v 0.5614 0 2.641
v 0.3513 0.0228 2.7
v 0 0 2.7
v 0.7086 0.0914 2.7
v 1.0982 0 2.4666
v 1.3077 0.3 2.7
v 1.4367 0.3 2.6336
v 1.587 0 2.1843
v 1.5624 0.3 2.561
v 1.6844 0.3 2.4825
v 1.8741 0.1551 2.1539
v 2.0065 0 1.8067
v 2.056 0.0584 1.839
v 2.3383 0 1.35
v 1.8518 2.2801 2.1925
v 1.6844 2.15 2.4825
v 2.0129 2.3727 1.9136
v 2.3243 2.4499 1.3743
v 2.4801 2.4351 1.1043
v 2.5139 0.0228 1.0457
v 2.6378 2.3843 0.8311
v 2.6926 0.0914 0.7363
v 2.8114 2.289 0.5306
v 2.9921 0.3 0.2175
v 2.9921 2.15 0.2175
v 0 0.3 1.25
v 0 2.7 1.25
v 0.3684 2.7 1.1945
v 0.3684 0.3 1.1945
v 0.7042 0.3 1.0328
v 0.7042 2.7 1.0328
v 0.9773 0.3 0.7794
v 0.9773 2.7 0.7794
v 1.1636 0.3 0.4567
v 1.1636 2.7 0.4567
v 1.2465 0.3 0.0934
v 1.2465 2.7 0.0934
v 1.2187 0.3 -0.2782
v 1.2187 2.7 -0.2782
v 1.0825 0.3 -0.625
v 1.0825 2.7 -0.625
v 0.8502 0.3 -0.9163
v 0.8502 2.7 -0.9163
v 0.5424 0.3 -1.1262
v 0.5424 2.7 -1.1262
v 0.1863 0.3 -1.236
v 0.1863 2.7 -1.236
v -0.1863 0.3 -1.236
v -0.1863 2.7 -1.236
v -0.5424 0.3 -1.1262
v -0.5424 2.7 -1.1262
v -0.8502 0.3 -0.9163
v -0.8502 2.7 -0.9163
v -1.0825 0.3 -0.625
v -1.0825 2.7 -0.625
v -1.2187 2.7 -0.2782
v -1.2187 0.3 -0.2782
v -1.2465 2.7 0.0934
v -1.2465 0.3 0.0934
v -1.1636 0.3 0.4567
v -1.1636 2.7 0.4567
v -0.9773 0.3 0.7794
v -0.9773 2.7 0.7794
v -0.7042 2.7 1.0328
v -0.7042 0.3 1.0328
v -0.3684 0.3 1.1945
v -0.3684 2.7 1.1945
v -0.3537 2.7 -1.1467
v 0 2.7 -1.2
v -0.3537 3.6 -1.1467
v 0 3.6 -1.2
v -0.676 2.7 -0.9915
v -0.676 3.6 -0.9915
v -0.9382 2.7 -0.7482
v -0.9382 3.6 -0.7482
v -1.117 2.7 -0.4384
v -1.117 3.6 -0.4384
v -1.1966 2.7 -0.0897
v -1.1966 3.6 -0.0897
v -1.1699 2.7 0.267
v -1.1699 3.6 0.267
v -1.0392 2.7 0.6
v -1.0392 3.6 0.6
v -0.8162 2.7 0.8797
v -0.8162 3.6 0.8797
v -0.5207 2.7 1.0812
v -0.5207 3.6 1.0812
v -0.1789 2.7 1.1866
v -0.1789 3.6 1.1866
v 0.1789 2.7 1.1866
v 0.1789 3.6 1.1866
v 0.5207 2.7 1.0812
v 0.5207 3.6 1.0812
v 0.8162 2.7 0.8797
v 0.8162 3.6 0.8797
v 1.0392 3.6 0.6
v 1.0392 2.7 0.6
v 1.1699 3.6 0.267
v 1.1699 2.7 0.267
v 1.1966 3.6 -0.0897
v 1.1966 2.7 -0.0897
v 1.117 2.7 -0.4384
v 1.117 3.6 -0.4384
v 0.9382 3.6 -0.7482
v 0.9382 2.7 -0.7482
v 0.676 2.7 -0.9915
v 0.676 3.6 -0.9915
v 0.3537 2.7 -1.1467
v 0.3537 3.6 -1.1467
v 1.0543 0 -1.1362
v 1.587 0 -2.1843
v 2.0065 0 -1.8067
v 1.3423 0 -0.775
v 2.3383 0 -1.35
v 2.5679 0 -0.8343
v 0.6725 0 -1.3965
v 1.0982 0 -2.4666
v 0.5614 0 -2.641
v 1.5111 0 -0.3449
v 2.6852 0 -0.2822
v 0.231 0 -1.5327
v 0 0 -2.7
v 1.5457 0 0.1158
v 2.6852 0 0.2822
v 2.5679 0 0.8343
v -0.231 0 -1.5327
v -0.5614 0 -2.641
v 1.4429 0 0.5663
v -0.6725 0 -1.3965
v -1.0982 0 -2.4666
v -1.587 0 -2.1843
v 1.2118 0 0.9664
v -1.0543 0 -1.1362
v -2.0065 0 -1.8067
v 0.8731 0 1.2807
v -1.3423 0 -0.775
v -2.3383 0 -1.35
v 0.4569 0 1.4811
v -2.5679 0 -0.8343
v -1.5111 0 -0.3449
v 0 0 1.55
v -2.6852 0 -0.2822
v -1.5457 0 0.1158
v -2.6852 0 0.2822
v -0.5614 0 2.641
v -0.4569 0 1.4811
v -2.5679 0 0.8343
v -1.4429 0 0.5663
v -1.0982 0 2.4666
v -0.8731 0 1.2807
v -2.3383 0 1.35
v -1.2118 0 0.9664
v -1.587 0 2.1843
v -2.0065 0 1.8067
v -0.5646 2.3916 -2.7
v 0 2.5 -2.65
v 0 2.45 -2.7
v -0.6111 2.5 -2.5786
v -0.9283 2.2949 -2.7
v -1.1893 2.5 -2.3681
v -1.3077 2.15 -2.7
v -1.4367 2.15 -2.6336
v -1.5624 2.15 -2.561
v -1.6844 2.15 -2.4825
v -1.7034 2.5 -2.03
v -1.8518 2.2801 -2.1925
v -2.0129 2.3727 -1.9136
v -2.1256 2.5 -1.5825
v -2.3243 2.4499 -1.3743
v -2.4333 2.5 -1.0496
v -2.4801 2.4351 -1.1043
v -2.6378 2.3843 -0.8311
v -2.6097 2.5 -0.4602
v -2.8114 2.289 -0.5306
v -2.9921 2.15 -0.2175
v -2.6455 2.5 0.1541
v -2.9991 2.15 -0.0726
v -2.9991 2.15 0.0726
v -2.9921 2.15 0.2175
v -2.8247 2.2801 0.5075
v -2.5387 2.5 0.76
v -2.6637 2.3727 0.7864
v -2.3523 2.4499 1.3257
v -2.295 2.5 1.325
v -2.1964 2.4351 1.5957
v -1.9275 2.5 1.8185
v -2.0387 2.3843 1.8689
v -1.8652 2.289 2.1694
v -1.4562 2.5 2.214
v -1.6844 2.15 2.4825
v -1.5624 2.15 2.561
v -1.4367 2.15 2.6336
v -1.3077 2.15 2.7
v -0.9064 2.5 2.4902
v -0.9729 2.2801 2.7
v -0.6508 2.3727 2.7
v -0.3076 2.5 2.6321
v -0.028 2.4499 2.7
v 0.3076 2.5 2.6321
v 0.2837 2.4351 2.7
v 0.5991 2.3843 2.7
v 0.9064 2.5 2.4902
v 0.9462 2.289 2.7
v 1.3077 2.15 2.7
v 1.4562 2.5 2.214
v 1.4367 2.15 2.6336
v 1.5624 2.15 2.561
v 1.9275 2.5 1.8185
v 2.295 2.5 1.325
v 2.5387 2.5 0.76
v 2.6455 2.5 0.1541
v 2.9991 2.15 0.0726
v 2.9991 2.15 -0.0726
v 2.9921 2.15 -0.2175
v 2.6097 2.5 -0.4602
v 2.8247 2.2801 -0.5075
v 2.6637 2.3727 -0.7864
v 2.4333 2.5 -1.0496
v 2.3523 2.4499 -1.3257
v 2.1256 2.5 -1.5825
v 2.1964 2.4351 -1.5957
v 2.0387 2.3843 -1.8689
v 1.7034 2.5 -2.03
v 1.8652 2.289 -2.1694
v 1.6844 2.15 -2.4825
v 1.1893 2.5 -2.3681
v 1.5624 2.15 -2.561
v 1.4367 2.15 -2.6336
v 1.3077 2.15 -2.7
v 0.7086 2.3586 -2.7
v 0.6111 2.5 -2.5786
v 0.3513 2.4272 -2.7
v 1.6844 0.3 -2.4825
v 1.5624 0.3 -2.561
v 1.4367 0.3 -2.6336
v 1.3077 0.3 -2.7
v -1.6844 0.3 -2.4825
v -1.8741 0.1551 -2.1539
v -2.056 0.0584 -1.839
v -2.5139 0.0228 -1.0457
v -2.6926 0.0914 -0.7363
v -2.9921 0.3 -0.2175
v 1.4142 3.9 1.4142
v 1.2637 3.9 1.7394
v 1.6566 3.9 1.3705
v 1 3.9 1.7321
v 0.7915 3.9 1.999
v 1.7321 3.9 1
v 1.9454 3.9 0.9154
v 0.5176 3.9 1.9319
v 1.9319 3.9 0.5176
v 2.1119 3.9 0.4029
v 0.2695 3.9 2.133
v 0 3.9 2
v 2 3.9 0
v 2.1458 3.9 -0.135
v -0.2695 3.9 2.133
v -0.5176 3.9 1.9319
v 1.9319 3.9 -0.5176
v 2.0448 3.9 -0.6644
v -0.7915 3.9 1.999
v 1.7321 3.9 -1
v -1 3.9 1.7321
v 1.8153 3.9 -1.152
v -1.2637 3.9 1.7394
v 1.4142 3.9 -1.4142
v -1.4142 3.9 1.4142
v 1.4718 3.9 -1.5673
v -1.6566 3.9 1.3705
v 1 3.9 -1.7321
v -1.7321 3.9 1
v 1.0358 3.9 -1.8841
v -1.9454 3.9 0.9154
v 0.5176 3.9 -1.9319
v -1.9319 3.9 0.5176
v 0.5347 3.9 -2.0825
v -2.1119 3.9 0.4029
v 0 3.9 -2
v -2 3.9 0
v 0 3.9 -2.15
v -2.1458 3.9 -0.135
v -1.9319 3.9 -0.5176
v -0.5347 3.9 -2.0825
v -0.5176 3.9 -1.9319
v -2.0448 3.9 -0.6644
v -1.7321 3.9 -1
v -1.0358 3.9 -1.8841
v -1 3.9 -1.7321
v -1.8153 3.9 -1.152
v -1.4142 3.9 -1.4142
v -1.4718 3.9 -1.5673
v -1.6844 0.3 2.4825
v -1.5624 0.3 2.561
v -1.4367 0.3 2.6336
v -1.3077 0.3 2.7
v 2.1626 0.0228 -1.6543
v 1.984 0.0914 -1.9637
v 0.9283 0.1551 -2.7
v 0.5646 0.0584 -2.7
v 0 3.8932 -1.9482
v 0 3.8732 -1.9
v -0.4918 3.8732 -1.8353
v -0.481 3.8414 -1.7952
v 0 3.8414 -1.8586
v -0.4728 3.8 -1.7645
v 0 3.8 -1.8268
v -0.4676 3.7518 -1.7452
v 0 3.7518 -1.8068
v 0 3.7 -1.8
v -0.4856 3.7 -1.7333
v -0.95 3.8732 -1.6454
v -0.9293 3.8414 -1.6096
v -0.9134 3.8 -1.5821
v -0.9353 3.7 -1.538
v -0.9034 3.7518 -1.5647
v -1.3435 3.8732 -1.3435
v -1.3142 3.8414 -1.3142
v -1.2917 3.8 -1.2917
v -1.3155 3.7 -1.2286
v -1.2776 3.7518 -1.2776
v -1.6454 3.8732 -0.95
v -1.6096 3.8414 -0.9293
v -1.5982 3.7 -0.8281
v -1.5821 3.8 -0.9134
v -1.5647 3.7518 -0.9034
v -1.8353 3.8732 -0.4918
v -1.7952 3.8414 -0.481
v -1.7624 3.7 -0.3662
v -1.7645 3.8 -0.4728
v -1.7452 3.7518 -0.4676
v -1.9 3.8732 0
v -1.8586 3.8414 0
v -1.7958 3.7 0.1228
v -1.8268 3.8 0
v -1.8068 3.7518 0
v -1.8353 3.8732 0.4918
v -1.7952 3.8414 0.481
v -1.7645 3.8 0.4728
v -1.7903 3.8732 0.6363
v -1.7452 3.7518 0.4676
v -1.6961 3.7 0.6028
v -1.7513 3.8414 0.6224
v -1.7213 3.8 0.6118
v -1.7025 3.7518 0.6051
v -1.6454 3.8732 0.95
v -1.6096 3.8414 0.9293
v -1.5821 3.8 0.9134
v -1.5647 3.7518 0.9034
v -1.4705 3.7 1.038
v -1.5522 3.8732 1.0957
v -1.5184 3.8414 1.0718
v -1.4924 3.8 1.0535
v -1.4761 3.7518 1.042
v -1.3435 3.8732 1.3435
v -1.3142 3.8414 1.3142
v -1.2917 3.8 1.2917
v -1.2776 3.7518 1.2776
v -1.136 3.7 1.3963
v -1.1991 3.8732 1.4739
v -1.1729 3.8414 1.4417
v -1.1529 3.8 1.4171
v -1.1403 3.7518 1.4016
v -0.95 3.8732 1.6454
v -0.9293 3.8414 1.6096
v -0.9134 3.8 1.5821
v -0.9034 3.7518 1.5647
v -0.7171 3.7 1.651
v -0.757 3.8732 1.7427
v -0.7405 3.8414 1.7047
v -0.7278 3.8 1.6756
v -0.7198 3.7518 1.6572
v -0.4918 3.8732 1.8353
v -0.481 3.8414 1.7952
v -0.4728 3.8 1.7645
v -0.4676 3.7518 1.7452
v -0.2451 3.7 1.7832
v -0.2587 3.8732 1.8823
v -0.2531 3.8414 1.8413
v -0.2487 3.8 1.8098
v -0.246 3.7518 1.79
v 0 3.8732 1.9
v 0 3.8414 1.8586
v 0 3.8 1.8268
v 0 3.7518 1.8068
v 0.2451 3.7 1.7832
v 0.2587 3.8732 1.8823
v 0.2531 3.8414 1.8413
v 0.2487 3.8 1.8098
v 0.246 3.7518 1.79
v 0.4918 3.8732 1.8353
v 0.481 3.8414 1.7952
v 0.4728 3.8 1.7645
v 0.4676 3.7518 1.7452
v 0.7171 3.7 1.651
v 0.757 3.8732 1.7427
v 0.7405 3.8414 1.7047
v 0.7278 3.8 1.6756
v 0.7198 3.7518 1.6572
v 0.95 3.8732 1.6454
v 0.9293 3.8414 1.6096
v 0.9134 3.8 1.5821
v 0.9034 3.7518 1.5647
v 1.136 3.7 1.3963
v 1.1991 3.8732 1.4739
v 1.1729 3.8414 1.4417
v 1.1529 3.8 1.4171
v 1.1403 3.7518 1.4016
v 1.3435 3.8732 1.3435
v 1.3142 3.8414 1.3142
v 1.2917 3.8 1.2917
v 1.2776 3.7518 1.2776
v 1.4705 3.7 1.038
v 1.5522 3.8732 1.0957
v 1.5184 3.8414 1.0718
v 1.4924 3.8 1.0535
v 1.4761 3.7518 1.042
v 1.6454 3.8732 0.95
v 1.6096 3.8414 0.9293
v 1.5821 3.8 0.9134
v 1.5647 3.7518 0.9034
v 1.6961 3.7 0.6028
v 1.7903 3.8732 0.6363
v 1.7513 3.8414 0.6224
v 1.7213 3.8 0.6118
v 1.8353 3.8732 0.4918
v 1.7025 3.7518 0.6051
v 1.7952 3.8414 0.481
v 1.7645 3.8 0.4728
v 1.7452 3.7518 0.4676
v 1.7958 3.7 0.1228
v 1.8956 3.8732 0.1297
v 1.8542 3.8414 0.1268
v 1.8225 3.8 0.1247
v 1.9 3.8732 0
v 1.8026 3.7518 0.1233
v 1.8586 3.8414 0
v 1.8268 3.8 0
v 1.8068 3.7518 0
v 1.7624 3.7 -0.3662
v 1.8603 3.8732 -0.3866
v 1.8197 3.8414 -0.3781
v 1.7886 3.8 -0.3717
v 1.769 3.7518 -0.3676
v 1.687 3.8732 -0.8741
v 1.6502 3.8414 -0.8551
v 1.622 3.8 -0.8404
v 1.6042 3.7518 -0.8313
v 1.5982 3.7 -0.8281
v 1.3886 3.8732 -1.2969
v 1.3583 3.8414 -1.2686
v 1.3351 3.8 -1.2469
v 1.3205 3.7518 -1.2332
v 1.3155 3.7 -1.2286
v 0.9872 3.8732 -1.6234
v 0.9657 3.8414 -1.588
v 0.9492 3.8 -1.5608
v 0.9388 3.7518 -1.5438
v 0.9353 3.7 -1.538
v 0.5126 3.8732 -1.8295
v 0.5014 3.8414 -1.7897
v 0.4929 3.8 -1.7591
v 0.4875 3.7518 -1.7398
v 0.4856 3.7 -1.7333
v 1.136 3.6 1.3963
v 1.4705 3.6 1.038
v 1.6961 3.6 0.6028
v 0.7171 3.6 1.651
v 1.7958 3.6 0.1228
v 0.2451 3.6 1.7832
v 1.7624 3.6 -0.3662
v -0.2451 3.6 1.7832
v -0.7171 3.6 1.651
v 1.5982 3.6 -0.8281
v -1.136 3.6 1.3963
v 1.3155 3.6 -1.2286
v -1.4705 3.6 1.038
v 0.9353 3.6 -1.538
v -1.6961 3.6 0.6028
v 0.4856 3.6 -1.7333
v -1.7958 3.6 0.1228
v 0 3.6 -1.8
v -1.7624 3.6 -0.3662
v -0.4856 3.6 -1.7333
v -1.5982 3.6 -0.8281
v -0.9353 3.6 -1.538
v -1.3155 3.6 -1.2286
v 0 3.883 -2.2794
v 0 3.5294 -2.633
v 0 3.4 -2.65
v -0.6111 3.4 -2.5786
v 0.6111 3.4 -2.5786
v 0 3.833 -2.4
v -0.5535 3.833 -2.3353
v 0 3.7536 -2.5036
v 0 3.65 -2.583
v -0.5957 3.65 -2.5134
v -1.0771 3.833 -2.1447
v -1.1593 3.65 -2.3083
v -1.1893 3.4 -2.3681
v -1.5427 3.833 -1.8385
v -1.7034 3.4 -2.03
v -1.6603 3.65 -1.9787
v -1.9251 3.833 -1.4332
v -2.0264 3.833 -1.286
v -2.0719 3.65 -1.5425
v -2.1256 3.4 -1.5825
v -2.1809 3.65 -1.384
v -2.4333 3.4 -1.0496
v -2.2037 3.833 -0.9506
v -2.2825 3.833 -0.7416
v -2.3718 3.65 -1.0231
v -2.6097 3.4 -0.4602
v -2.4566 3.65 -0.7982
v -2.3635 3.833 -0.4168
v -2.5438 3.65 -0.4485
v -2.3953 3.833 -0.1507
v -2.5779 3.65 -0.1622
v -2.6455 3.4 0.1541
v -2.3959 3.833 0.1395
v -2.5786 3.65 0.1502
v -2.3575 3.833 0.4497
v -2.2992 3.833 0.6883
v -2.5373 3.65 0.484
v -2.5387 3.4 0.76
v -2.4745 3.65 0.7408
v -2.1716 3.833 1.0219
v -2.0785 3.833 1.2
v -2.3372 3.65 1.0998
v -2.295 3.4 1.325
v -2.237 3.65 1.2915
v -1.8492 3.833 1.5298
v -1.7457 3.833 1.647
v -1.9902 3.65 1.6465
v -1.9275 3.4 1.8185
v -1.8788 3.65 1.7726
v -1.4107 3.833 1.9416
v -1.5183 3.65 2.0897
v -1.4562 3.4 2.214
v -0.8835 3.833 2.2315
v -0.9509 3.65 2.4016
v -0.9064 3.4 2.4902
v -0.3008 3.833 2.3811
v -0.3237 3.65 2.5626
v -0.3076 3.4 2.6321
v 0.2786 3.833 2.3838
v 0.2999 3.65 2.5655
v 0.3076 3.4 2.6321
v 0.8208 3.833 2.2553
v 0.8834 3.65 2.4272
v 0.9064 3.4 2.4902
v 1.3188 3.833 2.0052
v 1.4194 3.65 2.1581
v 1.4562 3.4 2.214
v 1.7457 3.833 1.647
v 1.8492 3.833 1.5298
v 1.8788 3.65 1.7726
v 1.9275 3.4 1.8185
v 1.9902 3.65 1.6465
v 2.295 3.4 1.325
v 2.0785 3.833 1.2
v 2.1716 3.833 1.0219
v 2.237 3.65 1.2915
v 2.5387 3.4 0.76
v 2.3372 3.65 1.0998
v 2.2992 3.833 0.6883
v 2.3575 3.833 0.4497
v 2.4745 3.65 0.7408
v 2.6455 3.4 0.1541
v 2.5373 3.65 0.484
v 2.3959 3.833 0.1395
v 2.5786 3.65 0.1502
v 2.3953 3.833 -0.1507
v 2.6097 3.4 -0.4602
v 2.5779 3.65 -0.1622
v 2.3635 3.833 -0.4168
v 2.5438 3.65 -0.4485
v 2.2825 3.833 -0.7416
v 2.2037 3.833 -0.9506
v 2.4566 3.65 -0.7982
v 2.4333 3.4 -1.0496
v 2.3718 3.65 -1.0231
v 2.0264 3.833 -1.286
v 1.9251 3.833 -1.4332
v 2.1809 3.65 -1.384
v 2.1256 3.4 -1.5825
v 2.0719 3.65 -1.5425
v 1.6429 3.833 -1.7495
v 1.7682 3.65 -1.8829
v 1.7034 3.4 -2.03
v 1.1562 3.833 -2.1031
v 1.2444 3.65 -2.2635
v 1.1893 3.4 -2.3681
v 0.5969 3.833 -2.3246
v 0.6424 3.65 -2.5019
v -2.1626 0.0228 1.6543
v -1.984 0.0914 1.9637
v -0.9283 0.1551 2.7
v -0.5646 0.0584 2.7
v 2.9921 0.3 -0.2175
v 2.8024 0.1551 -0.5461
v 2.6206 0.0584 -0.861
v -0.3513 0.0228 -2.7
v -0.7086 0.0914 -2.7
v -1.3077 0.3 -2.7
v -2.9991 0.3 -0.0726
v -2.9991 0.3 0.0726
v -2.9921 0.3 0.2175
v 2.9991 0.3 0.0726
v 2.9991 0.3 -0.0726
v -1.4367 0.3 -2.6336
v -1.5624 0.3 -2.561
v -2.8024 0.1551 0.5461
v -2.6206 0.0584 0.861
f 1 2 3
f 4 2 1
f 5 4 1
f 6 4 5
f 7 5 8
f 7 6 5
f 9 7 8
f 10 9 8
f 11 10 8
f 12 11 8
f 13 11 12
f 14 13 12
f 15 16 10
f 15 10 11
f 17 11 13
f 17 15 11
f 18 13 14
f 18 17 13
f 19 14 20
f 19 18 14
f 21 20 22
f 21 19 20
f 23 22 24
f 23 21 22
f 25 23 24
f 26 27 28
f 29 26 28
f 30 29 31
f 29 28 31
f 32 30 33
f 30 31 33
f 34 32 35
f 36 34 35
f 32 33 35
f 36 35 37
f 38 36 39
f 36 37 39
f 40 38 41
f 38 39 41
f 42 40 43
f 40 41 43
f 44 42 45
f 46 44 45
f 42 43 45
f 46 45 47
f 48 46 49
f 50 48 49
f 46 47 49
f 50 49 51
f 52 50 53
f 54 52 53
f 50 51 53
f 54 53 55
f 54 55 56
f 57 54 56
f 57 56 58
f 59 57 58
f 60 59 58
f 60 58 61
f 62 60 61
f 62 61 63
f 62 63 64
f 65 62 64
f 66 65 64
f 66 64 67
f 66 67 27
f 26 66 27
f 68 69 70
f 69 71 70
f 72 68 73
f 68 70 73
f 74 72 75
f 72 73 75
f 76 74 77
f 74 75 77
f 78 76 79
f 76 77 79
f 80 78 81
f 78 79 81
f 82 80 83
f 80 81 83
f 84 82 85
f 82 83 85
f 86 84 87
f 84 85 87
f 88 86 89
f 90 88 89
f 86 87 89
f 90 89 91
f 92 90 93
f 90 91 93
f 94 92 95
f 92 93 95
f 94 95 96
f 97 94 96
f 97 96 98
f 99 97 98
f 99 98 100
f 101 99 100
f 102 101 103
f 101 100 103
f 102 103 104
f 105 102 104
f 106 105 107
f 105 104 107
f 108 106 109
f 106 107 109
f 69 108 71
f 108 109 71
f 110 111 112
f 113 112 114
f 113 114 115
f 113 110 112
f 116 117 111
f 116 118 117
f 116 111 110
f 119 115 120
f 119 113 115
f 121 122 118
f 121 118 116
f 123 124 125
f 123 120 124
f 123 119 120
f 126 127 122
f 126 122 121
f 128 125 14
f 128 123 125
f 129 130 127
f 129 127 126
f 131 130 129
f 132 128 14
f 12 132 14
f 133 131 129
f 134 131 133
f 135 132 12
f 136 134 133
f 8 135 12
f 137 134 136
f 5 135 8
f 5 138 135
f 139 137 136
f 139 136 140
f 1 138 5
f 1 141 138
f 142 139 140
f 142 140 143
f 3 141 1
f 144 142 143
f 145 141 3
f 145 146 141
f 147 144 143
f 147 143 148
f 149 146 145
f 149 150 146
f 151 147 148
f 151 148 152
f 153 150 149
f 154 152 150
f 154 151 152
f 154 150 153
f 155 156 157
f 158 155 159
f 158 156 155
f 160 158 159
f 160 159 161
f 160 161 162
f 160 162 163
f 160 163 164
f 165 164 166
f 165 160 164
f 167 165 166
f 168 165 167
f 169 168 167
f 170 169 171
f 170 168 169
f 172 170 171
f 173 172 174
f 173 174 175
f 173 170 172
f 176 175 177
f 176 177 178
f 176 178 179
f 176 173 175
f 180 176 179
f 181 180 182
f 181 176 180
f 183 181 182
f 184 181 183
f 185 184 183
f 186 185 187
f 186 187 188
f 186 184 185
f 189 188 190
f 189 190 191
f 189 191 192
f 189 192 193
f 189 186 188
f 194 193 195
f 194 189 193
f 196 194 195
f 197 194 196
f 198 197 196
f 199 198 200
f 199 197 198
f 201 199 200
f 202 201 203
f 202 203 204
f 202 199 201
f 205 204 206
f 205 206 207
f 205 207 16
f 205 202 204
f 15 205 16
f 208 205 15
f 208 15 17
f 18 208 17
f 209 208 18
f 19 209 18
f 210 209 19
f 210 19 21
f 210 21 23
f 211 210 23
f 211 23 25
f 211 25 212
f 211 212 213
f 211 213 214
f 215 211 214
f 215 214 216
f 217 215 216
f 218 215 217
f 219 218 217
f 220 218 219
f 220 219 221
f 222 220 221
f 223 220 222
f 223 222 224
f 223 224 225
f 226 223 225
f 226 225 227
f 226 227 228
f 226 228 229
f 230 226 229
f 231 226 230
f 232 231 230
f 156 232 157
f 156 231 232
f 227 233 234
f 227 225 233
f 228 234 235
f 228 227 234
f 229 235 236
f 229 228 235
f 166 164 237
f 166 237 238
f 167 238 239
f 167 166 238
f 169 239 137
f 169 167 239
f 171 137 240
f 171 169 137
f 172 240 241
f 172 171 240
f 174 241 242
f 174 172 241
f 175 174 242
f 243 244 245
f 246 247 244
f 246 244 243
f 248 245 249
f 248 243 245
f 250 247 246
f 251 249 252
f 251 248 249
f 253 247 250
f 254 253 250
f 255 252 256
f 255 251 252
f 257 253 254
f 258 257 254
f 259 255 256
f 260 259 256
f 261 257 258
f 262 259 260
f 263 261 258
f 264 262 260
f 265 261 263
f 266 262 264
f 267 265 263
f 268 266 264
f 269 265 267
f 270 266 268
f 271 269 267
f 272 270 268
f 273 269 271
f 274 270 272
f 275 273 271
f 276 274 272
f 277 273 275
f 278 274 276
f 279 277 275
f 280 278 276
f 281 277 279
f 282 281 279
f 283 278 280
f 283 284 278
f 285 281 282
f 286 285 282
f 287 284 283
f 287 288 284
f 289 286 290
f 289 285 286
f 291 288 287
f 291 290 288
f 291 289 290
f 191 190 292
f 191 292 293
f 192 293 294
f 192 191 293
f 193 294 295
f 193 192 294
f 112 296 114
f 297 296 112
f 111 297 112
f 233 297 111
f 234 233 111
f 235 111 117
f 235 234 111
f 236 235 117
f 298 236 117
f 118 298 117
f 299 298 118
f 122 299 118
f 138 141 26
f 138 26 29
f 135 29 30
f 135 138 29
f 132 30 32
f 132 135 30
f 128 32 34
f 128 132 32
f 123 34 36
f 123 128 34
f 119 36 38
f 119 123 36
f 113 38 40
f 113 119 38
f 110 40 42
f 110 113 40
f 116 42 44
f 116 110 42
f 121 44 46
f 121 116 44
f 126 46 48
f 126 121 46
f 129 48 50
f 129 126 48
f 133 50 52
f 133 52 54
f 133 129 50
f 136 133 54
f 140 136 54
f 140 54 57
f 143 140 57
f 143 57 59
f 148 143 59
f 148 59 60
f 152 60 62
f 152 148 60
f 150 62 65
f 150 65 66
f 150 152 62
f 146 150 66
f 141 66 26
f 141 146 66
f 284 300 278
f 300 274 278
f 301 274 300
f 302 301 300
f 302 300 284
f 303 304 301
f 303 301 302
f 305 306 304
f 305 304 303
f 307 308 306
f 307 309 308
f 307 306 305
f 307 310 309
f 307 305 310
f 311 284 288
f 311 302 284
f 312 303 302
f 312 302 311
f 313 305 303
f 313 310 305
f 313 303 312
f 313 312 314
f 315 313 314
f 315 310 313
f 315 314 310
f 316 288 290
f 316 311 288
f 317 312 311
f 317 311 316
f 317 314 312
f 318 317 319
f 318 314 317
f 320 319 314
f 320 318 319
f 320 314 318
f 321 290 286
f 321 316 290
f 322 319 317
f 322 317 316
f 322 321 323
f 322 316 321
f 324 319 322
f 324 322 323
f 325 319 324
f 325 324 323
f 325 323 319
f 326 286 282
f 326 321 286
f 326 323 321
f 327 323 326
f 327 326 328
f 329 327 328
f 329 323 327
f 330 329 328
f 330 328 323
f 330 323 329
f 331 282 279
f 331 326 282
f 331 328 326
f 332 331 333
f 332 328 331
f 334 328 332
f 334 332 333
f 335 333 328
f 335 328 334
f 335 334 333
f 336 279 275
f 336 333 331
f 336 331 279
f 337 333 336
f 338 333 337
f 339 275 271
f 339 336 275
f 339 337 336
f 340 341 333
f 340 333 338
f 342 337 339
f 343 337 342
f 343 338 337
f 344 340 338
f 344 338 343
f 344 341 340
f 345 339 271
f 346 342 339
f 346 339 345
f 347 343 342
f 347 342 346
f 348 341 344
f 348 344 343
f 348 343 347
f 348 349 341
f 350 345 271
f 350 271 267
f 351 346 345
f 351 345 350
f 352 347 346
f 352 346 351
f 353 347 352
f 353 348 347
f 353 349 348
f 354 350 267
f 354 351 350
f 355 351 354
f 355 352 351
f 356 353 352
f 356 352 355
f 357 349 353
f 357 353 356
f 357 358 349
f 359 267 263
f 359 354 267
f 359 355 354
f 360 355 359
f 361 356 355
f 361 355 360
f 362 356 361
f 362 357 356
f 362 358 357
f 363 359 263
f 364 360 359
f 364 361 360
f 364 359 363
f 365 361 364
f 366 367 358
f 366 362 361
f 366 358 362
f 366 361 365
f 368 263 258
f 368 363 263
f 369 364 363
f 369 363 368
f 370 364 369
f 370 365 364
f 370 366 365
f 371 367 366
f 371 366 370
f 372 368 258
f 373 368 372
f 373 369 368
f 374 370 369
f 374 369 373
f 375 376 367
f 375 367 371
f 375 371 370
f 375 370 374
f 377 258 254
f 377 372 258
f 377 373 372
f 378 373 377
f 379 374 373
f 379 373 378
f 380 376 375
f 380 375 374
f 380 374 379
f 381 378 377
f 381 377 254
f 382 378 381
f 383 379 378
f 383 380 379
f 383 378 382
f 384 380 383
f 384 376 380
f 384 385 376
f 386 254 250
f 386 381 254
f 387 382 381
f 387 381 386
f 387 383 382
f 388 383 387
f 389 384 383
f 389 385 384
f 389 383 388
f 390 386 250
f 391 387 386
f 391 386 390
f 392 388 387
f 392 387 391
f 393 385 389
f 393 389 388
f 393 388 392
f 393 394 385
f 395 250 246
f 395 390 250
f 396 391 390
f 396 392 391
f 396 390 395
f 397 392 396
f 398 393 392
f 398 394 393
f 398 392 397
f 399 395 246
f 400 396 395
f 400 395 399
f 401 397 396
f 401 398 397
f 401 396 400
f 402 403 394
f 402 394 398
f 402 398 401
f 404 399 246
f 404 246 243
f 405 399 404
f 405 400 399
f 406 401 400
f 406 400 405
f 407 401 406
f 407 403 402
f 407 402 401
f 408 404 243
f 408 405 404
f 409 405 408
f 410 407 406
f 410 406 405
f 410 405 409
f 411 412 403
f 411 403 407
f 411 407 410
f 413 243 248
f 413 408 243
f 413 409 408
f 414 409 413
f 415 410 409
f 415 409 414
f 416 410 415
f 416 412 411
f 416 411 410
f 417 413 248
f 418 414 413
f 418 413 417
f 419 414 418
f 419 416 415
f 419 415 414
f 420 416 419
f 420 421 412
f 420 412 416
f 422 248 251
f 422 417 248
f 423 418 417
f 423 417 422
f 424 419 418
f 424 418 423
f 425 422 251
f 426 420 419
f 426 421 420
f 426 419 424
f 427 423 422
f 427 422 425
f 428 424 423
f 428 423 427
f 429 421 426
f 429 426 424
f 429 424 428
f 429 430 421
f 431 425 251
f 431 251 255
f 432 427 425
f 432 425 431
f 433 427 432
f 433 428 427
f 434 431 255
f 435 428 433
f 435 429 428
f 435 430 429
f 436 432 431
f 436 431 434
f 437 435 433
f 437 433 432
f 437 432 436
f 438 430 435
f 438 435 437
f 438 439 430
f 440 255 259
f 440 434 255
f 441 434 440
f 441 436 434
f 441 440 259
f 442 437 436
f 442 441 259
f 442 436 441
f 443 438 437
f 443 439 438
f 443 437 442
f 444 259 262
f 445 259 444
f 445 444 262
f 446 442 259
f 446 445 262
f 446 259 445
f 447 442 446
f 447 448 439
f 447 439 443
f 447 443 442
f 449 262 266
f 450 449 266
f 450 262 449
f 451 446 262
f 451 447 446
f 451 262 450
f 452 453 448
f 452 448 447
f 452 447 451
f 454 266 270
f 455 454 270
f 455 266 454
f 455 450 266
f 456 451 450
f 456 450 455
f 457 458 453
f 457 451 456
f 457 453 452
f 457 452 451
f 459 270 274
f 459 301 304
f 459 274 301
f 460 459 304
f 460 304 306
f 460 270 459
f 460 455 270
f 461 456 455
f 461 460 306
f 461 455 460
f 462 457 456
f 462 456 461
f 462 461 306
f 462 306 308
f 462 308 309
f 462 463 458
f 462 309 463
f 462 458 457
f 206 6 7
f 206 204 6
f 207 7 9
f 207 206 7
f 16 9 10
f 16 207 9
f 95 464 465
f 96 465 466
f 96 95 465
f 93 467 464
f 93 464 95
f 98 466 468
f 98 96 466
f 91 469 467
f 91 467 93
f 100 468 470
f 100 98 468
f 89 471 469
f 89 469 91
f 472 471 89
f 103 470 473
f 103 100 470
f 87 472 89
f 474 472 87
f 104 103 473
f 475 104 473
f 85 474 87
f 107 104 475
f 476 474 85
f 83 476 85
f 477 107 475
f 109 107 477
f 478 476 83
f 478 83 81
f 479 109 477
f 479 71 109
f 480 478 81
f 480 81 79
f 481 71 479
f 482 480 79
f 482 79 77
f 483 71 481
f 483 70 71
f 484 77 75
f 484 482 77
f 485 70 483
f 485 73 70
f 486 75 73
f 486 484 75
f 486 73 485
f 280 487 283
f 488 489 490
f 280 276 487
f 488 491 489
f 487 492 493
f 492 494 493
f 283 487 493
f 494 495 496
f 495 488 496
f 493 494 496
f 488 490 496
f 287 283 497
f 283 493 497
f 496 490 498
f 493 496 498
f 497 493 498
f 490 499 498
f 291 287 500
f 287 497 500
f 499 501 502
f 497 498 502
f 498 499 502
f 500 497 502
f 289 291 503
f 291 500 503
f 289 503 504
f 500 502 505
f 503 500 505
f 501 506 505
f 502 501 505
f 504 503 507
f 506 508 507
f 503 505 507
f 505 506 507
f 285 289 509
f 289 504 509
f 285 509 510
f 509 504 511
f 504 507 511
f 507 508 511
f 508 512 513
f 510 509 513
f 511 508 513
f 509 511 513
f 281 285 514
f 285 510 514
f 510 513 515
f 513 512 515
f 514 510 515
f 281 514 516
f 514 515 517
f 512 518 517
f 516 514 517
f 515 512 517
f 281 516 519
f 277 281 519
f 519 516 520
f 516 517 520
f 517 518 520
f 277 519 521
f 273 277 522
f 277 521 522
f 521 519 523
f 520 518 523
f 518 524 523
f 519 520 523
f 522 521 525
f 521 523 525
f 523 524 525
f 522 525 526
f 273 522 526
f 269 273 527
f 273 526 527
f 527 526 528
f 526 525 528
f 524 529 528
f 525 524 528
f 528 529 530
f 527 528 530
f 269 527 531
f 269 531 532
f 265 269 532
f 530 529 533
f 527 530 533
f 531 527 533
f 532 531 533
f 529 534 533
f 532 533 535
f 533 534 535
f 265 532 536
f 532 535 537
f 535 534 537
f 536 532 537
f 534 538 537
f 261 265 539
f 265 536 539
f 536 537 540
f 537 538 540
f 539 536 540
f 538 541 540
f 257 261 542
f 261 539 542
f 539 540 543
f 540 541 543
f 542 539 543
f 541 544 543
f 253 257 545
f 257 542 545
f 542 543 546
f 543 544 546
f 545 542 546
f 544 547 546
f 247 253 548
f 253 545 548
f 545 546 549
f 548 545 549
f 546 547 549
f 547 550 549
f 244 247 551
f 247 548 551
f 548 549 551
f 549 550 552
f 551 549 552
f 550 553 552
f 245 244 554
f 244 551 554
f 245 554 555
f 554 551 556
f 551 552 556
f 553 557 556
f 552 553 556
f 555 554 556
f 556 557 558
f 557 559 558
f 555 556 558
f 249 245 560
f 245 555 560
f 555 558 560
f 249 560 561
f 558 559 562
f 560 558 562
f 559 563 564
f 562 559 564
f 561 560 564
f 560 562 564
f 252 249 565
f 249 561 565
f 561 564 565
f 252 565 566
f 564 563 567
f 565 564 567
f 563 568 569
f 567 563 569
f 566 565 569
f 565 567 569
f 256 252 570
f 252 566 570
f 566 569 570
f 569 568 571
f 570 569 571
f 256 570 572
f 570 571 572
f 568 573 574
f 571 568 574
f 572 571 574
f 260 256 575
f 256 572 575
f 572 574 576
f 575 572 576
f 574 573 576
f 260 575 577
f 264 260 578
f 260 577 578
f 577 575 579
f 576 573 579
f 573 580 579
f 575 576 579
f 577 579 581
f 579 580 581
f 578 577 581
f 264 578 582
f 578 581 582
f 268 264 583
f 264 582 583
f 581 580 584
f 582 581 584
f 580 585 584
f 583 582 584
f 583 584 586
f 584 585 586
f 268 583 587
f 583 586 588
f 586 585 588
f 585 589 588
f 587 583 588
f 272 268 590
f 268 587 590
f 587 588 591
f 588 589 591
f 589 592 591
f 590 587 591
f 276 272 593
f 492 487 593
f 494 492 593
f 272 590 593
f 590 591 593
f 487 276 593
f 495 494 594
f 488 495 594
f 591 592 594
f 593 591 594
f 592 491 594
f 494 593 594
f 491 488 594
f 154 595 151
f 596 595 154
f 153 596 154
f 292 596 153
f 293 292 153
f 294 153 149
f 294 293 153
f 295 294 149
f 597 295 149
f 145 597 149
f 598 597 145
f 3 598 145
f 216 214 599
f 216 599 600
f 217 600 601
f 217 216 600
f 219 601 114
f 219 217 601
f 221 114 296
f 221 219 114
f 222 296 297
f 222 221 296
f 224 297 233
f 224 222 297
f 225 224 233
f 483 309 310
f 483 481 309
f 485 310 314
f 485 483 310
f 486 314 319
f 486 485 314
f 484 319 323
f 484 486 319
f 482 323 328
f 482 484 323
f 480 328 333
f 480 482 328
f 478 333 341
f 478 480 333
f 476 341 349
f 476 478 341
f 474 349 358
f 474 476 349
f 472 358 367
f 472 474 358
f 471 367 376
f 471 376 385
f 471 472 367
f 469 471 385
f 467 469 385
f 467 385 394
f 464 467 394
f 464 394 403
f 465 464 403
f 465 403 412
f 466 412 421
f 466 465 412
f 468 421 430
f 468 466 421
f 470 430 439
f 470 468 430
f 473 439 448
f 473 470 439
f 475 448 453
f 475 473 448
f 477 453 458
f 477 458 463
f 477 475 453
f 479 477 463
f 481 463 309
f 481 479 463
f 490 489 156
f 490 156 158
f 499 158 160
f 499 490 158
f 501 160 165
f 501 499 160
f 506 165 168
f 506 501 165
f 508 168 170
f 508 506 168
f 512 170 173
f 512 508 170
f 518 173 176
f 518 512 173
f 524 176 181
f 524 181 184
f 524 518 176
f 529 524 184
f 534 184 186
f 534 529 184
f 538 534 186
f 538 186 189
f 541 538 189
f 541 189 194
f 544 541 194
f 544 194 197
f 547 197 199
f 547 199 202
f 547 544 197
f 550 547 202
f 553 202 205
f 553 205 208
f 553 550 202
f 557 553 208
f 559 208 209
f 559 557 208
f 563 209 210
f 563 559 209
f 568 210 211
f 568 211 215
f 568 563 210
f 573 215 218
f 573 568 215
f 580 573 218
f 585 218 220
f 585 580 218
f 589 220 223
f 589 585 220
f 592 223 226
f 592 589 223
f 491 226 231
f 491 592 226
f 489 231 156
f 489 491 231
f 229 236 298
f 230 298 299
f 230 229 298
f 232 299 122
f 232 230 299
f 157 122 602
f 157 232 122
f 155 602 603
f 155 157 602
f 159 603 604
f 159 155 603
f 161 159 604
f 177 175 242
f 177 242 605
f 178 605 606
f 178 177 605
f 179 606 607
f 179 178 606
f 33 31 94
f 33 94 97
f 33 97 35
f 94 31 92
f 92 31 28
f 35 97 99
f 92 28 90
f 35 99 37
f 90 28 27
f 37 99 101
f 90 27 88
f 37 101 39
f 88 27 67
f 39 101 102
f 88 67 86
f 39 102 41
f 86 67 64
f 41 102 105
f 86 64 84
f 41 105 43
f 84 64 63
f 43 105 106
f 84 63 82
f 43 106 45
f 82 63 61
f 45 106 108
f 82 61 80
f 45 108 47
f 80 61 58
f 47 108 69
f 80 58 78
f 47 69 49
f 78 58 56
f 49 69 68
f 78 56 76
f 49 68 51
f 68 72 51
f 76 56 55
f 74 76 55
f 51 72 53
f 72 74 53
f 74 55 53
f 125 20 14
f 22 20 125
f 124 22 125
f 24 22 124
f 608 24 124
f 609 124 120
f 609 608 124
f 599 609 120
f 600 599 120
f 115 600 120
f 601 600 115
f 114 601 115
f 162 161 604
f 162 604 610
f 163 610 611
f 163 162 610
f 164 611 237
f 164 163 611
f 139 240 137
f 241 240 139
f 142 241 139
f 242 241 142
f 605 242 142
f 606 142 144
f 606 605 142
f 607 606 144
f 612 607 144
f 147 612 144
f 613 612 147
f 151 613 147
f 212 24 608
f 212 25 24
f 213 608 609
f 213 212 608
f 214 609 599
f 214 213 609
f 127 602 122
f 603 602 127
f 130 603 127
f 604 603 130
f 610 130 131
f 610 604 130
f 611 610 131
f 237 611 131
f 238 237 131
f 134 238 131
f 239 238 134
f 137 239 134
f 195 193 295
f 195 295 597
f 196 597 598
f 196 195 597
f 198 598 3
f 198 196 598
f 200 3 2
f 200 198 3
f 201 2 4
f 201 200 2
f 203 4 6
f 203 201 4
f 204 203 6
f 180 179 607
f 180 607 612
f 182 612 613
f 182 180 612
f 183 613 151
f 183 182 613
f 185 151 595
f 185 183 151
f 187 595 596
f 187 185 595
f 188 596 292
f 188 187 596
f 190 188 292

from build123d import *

# Parameters (mm, degrees)
SKETCH3_OUTSIDE_W     = 9.868
SKETCH3_OUTSIDE_H     = 9.868
CUT_EXTRUDE1_DEPTH    = 10
FILLET2_R             = 0.5
FILLET3_R             = 0.2
M3_TAPPED_HOLE4_D     = 2.5
M3_TAPPED_HOLE4_DEPTH = 21.5
M3_TAPPED_HOLE4_TIP   = 0.751075774
CHAMFER1_SIZE         = 0.3
SKETCH6_W             = 0.6
SKETCH6_H             = 0.9


with BuildPart() as part:
    # Sketch1 → Revolve1 (revolve)
    with BuildSketch(Plane.XY):
        Polygon((1, 0), (2.7, 0), (3, 0.3), (3, 2.15), (2.65, 2.5), (2.65, 3.9), (1.8, 3.9), (1.8, 2.7), (1, 2.7), align=None)
    revolve(axis=Axis((0, 0, 0), (0, 1, 0)))

    # Sketch3 outside → Cut-Extrude1 (cut)
    with BuildSketch(Plane(origin=(0, 3.9, 0), x_dir=(1, 0, 0), z_dir=(0, 1, 0))):
        Rectangle(SKETCH3_OUTSIDE_W, SKETCH3_OUTSIDE_H)
        Polygon((3.117691454, 0), (1.558845727, 2.7), (-1.558845727, 2.7), (-3.117691454, 0), (-1.558845727, -2.7), (1.558845727, -2.7), align=None, mode=Mode.SUBTRACT)
    extrude(amount=-CUT_EXTRUDE1_DEPTH, mode=Mode.SUBTRACT)

    # Fillet2
    fillet2_edges = [part.edges().sort_by_distance(p)[0] for p in [
        (-2.65, 3.9, 0),
    ]]
    fillet(fillet2_edges, radius=FILLET2_R)

    # Fillet3
    fillet3_edges = [part.edges().sort_by_distance(p)[0] for p in [
        (-1.8, 3.9, 0),
    ]]
    fillet(fillet3_edges, radius=FILLET3_R)

    # M3 Tapped Hole4
    with Locations(Plane(origin=(0, 0, 0), x_dir=(0, 0, -1), z_dir=(0, -1, 0))):
        with Locations((0, 0)):
            Hole(M3_TAPPED_HOLE4_D / 2, depth=M3_TAPPED_HOLE4_DEPTH)
            with Locations((0, 0, -(M3_TAPPED_HOLE4_DEPTH + M3_TAPPED_HOLE4_TIP / 2))):  # 118° drill point
                Cone(0, M3_TAPPED_HOLE4_D / 2, M3_TAPPED_HOLE4_TIP, mode=Mode.SUBTRACT)

    # Chamfer1
    chamfer1_edges = [part.edges().sort_by_distance(p)[0] for p in [
        (0, 0, -1.25),
    ]]
    chamfer(chamfer1_edges, length=CHAMFER1_SIZE)

    # Sketch6 → Revolve2 (revolve)
    with BuildSketch(Plane.XY):
        with Locations((-1.5, 3.15)):
            Rectangle(SKETCH6_W, SKETCH6_H)
    revolve(axis=Axis((0, 0, 0), (0, 1, 0)))


solid = part.part
